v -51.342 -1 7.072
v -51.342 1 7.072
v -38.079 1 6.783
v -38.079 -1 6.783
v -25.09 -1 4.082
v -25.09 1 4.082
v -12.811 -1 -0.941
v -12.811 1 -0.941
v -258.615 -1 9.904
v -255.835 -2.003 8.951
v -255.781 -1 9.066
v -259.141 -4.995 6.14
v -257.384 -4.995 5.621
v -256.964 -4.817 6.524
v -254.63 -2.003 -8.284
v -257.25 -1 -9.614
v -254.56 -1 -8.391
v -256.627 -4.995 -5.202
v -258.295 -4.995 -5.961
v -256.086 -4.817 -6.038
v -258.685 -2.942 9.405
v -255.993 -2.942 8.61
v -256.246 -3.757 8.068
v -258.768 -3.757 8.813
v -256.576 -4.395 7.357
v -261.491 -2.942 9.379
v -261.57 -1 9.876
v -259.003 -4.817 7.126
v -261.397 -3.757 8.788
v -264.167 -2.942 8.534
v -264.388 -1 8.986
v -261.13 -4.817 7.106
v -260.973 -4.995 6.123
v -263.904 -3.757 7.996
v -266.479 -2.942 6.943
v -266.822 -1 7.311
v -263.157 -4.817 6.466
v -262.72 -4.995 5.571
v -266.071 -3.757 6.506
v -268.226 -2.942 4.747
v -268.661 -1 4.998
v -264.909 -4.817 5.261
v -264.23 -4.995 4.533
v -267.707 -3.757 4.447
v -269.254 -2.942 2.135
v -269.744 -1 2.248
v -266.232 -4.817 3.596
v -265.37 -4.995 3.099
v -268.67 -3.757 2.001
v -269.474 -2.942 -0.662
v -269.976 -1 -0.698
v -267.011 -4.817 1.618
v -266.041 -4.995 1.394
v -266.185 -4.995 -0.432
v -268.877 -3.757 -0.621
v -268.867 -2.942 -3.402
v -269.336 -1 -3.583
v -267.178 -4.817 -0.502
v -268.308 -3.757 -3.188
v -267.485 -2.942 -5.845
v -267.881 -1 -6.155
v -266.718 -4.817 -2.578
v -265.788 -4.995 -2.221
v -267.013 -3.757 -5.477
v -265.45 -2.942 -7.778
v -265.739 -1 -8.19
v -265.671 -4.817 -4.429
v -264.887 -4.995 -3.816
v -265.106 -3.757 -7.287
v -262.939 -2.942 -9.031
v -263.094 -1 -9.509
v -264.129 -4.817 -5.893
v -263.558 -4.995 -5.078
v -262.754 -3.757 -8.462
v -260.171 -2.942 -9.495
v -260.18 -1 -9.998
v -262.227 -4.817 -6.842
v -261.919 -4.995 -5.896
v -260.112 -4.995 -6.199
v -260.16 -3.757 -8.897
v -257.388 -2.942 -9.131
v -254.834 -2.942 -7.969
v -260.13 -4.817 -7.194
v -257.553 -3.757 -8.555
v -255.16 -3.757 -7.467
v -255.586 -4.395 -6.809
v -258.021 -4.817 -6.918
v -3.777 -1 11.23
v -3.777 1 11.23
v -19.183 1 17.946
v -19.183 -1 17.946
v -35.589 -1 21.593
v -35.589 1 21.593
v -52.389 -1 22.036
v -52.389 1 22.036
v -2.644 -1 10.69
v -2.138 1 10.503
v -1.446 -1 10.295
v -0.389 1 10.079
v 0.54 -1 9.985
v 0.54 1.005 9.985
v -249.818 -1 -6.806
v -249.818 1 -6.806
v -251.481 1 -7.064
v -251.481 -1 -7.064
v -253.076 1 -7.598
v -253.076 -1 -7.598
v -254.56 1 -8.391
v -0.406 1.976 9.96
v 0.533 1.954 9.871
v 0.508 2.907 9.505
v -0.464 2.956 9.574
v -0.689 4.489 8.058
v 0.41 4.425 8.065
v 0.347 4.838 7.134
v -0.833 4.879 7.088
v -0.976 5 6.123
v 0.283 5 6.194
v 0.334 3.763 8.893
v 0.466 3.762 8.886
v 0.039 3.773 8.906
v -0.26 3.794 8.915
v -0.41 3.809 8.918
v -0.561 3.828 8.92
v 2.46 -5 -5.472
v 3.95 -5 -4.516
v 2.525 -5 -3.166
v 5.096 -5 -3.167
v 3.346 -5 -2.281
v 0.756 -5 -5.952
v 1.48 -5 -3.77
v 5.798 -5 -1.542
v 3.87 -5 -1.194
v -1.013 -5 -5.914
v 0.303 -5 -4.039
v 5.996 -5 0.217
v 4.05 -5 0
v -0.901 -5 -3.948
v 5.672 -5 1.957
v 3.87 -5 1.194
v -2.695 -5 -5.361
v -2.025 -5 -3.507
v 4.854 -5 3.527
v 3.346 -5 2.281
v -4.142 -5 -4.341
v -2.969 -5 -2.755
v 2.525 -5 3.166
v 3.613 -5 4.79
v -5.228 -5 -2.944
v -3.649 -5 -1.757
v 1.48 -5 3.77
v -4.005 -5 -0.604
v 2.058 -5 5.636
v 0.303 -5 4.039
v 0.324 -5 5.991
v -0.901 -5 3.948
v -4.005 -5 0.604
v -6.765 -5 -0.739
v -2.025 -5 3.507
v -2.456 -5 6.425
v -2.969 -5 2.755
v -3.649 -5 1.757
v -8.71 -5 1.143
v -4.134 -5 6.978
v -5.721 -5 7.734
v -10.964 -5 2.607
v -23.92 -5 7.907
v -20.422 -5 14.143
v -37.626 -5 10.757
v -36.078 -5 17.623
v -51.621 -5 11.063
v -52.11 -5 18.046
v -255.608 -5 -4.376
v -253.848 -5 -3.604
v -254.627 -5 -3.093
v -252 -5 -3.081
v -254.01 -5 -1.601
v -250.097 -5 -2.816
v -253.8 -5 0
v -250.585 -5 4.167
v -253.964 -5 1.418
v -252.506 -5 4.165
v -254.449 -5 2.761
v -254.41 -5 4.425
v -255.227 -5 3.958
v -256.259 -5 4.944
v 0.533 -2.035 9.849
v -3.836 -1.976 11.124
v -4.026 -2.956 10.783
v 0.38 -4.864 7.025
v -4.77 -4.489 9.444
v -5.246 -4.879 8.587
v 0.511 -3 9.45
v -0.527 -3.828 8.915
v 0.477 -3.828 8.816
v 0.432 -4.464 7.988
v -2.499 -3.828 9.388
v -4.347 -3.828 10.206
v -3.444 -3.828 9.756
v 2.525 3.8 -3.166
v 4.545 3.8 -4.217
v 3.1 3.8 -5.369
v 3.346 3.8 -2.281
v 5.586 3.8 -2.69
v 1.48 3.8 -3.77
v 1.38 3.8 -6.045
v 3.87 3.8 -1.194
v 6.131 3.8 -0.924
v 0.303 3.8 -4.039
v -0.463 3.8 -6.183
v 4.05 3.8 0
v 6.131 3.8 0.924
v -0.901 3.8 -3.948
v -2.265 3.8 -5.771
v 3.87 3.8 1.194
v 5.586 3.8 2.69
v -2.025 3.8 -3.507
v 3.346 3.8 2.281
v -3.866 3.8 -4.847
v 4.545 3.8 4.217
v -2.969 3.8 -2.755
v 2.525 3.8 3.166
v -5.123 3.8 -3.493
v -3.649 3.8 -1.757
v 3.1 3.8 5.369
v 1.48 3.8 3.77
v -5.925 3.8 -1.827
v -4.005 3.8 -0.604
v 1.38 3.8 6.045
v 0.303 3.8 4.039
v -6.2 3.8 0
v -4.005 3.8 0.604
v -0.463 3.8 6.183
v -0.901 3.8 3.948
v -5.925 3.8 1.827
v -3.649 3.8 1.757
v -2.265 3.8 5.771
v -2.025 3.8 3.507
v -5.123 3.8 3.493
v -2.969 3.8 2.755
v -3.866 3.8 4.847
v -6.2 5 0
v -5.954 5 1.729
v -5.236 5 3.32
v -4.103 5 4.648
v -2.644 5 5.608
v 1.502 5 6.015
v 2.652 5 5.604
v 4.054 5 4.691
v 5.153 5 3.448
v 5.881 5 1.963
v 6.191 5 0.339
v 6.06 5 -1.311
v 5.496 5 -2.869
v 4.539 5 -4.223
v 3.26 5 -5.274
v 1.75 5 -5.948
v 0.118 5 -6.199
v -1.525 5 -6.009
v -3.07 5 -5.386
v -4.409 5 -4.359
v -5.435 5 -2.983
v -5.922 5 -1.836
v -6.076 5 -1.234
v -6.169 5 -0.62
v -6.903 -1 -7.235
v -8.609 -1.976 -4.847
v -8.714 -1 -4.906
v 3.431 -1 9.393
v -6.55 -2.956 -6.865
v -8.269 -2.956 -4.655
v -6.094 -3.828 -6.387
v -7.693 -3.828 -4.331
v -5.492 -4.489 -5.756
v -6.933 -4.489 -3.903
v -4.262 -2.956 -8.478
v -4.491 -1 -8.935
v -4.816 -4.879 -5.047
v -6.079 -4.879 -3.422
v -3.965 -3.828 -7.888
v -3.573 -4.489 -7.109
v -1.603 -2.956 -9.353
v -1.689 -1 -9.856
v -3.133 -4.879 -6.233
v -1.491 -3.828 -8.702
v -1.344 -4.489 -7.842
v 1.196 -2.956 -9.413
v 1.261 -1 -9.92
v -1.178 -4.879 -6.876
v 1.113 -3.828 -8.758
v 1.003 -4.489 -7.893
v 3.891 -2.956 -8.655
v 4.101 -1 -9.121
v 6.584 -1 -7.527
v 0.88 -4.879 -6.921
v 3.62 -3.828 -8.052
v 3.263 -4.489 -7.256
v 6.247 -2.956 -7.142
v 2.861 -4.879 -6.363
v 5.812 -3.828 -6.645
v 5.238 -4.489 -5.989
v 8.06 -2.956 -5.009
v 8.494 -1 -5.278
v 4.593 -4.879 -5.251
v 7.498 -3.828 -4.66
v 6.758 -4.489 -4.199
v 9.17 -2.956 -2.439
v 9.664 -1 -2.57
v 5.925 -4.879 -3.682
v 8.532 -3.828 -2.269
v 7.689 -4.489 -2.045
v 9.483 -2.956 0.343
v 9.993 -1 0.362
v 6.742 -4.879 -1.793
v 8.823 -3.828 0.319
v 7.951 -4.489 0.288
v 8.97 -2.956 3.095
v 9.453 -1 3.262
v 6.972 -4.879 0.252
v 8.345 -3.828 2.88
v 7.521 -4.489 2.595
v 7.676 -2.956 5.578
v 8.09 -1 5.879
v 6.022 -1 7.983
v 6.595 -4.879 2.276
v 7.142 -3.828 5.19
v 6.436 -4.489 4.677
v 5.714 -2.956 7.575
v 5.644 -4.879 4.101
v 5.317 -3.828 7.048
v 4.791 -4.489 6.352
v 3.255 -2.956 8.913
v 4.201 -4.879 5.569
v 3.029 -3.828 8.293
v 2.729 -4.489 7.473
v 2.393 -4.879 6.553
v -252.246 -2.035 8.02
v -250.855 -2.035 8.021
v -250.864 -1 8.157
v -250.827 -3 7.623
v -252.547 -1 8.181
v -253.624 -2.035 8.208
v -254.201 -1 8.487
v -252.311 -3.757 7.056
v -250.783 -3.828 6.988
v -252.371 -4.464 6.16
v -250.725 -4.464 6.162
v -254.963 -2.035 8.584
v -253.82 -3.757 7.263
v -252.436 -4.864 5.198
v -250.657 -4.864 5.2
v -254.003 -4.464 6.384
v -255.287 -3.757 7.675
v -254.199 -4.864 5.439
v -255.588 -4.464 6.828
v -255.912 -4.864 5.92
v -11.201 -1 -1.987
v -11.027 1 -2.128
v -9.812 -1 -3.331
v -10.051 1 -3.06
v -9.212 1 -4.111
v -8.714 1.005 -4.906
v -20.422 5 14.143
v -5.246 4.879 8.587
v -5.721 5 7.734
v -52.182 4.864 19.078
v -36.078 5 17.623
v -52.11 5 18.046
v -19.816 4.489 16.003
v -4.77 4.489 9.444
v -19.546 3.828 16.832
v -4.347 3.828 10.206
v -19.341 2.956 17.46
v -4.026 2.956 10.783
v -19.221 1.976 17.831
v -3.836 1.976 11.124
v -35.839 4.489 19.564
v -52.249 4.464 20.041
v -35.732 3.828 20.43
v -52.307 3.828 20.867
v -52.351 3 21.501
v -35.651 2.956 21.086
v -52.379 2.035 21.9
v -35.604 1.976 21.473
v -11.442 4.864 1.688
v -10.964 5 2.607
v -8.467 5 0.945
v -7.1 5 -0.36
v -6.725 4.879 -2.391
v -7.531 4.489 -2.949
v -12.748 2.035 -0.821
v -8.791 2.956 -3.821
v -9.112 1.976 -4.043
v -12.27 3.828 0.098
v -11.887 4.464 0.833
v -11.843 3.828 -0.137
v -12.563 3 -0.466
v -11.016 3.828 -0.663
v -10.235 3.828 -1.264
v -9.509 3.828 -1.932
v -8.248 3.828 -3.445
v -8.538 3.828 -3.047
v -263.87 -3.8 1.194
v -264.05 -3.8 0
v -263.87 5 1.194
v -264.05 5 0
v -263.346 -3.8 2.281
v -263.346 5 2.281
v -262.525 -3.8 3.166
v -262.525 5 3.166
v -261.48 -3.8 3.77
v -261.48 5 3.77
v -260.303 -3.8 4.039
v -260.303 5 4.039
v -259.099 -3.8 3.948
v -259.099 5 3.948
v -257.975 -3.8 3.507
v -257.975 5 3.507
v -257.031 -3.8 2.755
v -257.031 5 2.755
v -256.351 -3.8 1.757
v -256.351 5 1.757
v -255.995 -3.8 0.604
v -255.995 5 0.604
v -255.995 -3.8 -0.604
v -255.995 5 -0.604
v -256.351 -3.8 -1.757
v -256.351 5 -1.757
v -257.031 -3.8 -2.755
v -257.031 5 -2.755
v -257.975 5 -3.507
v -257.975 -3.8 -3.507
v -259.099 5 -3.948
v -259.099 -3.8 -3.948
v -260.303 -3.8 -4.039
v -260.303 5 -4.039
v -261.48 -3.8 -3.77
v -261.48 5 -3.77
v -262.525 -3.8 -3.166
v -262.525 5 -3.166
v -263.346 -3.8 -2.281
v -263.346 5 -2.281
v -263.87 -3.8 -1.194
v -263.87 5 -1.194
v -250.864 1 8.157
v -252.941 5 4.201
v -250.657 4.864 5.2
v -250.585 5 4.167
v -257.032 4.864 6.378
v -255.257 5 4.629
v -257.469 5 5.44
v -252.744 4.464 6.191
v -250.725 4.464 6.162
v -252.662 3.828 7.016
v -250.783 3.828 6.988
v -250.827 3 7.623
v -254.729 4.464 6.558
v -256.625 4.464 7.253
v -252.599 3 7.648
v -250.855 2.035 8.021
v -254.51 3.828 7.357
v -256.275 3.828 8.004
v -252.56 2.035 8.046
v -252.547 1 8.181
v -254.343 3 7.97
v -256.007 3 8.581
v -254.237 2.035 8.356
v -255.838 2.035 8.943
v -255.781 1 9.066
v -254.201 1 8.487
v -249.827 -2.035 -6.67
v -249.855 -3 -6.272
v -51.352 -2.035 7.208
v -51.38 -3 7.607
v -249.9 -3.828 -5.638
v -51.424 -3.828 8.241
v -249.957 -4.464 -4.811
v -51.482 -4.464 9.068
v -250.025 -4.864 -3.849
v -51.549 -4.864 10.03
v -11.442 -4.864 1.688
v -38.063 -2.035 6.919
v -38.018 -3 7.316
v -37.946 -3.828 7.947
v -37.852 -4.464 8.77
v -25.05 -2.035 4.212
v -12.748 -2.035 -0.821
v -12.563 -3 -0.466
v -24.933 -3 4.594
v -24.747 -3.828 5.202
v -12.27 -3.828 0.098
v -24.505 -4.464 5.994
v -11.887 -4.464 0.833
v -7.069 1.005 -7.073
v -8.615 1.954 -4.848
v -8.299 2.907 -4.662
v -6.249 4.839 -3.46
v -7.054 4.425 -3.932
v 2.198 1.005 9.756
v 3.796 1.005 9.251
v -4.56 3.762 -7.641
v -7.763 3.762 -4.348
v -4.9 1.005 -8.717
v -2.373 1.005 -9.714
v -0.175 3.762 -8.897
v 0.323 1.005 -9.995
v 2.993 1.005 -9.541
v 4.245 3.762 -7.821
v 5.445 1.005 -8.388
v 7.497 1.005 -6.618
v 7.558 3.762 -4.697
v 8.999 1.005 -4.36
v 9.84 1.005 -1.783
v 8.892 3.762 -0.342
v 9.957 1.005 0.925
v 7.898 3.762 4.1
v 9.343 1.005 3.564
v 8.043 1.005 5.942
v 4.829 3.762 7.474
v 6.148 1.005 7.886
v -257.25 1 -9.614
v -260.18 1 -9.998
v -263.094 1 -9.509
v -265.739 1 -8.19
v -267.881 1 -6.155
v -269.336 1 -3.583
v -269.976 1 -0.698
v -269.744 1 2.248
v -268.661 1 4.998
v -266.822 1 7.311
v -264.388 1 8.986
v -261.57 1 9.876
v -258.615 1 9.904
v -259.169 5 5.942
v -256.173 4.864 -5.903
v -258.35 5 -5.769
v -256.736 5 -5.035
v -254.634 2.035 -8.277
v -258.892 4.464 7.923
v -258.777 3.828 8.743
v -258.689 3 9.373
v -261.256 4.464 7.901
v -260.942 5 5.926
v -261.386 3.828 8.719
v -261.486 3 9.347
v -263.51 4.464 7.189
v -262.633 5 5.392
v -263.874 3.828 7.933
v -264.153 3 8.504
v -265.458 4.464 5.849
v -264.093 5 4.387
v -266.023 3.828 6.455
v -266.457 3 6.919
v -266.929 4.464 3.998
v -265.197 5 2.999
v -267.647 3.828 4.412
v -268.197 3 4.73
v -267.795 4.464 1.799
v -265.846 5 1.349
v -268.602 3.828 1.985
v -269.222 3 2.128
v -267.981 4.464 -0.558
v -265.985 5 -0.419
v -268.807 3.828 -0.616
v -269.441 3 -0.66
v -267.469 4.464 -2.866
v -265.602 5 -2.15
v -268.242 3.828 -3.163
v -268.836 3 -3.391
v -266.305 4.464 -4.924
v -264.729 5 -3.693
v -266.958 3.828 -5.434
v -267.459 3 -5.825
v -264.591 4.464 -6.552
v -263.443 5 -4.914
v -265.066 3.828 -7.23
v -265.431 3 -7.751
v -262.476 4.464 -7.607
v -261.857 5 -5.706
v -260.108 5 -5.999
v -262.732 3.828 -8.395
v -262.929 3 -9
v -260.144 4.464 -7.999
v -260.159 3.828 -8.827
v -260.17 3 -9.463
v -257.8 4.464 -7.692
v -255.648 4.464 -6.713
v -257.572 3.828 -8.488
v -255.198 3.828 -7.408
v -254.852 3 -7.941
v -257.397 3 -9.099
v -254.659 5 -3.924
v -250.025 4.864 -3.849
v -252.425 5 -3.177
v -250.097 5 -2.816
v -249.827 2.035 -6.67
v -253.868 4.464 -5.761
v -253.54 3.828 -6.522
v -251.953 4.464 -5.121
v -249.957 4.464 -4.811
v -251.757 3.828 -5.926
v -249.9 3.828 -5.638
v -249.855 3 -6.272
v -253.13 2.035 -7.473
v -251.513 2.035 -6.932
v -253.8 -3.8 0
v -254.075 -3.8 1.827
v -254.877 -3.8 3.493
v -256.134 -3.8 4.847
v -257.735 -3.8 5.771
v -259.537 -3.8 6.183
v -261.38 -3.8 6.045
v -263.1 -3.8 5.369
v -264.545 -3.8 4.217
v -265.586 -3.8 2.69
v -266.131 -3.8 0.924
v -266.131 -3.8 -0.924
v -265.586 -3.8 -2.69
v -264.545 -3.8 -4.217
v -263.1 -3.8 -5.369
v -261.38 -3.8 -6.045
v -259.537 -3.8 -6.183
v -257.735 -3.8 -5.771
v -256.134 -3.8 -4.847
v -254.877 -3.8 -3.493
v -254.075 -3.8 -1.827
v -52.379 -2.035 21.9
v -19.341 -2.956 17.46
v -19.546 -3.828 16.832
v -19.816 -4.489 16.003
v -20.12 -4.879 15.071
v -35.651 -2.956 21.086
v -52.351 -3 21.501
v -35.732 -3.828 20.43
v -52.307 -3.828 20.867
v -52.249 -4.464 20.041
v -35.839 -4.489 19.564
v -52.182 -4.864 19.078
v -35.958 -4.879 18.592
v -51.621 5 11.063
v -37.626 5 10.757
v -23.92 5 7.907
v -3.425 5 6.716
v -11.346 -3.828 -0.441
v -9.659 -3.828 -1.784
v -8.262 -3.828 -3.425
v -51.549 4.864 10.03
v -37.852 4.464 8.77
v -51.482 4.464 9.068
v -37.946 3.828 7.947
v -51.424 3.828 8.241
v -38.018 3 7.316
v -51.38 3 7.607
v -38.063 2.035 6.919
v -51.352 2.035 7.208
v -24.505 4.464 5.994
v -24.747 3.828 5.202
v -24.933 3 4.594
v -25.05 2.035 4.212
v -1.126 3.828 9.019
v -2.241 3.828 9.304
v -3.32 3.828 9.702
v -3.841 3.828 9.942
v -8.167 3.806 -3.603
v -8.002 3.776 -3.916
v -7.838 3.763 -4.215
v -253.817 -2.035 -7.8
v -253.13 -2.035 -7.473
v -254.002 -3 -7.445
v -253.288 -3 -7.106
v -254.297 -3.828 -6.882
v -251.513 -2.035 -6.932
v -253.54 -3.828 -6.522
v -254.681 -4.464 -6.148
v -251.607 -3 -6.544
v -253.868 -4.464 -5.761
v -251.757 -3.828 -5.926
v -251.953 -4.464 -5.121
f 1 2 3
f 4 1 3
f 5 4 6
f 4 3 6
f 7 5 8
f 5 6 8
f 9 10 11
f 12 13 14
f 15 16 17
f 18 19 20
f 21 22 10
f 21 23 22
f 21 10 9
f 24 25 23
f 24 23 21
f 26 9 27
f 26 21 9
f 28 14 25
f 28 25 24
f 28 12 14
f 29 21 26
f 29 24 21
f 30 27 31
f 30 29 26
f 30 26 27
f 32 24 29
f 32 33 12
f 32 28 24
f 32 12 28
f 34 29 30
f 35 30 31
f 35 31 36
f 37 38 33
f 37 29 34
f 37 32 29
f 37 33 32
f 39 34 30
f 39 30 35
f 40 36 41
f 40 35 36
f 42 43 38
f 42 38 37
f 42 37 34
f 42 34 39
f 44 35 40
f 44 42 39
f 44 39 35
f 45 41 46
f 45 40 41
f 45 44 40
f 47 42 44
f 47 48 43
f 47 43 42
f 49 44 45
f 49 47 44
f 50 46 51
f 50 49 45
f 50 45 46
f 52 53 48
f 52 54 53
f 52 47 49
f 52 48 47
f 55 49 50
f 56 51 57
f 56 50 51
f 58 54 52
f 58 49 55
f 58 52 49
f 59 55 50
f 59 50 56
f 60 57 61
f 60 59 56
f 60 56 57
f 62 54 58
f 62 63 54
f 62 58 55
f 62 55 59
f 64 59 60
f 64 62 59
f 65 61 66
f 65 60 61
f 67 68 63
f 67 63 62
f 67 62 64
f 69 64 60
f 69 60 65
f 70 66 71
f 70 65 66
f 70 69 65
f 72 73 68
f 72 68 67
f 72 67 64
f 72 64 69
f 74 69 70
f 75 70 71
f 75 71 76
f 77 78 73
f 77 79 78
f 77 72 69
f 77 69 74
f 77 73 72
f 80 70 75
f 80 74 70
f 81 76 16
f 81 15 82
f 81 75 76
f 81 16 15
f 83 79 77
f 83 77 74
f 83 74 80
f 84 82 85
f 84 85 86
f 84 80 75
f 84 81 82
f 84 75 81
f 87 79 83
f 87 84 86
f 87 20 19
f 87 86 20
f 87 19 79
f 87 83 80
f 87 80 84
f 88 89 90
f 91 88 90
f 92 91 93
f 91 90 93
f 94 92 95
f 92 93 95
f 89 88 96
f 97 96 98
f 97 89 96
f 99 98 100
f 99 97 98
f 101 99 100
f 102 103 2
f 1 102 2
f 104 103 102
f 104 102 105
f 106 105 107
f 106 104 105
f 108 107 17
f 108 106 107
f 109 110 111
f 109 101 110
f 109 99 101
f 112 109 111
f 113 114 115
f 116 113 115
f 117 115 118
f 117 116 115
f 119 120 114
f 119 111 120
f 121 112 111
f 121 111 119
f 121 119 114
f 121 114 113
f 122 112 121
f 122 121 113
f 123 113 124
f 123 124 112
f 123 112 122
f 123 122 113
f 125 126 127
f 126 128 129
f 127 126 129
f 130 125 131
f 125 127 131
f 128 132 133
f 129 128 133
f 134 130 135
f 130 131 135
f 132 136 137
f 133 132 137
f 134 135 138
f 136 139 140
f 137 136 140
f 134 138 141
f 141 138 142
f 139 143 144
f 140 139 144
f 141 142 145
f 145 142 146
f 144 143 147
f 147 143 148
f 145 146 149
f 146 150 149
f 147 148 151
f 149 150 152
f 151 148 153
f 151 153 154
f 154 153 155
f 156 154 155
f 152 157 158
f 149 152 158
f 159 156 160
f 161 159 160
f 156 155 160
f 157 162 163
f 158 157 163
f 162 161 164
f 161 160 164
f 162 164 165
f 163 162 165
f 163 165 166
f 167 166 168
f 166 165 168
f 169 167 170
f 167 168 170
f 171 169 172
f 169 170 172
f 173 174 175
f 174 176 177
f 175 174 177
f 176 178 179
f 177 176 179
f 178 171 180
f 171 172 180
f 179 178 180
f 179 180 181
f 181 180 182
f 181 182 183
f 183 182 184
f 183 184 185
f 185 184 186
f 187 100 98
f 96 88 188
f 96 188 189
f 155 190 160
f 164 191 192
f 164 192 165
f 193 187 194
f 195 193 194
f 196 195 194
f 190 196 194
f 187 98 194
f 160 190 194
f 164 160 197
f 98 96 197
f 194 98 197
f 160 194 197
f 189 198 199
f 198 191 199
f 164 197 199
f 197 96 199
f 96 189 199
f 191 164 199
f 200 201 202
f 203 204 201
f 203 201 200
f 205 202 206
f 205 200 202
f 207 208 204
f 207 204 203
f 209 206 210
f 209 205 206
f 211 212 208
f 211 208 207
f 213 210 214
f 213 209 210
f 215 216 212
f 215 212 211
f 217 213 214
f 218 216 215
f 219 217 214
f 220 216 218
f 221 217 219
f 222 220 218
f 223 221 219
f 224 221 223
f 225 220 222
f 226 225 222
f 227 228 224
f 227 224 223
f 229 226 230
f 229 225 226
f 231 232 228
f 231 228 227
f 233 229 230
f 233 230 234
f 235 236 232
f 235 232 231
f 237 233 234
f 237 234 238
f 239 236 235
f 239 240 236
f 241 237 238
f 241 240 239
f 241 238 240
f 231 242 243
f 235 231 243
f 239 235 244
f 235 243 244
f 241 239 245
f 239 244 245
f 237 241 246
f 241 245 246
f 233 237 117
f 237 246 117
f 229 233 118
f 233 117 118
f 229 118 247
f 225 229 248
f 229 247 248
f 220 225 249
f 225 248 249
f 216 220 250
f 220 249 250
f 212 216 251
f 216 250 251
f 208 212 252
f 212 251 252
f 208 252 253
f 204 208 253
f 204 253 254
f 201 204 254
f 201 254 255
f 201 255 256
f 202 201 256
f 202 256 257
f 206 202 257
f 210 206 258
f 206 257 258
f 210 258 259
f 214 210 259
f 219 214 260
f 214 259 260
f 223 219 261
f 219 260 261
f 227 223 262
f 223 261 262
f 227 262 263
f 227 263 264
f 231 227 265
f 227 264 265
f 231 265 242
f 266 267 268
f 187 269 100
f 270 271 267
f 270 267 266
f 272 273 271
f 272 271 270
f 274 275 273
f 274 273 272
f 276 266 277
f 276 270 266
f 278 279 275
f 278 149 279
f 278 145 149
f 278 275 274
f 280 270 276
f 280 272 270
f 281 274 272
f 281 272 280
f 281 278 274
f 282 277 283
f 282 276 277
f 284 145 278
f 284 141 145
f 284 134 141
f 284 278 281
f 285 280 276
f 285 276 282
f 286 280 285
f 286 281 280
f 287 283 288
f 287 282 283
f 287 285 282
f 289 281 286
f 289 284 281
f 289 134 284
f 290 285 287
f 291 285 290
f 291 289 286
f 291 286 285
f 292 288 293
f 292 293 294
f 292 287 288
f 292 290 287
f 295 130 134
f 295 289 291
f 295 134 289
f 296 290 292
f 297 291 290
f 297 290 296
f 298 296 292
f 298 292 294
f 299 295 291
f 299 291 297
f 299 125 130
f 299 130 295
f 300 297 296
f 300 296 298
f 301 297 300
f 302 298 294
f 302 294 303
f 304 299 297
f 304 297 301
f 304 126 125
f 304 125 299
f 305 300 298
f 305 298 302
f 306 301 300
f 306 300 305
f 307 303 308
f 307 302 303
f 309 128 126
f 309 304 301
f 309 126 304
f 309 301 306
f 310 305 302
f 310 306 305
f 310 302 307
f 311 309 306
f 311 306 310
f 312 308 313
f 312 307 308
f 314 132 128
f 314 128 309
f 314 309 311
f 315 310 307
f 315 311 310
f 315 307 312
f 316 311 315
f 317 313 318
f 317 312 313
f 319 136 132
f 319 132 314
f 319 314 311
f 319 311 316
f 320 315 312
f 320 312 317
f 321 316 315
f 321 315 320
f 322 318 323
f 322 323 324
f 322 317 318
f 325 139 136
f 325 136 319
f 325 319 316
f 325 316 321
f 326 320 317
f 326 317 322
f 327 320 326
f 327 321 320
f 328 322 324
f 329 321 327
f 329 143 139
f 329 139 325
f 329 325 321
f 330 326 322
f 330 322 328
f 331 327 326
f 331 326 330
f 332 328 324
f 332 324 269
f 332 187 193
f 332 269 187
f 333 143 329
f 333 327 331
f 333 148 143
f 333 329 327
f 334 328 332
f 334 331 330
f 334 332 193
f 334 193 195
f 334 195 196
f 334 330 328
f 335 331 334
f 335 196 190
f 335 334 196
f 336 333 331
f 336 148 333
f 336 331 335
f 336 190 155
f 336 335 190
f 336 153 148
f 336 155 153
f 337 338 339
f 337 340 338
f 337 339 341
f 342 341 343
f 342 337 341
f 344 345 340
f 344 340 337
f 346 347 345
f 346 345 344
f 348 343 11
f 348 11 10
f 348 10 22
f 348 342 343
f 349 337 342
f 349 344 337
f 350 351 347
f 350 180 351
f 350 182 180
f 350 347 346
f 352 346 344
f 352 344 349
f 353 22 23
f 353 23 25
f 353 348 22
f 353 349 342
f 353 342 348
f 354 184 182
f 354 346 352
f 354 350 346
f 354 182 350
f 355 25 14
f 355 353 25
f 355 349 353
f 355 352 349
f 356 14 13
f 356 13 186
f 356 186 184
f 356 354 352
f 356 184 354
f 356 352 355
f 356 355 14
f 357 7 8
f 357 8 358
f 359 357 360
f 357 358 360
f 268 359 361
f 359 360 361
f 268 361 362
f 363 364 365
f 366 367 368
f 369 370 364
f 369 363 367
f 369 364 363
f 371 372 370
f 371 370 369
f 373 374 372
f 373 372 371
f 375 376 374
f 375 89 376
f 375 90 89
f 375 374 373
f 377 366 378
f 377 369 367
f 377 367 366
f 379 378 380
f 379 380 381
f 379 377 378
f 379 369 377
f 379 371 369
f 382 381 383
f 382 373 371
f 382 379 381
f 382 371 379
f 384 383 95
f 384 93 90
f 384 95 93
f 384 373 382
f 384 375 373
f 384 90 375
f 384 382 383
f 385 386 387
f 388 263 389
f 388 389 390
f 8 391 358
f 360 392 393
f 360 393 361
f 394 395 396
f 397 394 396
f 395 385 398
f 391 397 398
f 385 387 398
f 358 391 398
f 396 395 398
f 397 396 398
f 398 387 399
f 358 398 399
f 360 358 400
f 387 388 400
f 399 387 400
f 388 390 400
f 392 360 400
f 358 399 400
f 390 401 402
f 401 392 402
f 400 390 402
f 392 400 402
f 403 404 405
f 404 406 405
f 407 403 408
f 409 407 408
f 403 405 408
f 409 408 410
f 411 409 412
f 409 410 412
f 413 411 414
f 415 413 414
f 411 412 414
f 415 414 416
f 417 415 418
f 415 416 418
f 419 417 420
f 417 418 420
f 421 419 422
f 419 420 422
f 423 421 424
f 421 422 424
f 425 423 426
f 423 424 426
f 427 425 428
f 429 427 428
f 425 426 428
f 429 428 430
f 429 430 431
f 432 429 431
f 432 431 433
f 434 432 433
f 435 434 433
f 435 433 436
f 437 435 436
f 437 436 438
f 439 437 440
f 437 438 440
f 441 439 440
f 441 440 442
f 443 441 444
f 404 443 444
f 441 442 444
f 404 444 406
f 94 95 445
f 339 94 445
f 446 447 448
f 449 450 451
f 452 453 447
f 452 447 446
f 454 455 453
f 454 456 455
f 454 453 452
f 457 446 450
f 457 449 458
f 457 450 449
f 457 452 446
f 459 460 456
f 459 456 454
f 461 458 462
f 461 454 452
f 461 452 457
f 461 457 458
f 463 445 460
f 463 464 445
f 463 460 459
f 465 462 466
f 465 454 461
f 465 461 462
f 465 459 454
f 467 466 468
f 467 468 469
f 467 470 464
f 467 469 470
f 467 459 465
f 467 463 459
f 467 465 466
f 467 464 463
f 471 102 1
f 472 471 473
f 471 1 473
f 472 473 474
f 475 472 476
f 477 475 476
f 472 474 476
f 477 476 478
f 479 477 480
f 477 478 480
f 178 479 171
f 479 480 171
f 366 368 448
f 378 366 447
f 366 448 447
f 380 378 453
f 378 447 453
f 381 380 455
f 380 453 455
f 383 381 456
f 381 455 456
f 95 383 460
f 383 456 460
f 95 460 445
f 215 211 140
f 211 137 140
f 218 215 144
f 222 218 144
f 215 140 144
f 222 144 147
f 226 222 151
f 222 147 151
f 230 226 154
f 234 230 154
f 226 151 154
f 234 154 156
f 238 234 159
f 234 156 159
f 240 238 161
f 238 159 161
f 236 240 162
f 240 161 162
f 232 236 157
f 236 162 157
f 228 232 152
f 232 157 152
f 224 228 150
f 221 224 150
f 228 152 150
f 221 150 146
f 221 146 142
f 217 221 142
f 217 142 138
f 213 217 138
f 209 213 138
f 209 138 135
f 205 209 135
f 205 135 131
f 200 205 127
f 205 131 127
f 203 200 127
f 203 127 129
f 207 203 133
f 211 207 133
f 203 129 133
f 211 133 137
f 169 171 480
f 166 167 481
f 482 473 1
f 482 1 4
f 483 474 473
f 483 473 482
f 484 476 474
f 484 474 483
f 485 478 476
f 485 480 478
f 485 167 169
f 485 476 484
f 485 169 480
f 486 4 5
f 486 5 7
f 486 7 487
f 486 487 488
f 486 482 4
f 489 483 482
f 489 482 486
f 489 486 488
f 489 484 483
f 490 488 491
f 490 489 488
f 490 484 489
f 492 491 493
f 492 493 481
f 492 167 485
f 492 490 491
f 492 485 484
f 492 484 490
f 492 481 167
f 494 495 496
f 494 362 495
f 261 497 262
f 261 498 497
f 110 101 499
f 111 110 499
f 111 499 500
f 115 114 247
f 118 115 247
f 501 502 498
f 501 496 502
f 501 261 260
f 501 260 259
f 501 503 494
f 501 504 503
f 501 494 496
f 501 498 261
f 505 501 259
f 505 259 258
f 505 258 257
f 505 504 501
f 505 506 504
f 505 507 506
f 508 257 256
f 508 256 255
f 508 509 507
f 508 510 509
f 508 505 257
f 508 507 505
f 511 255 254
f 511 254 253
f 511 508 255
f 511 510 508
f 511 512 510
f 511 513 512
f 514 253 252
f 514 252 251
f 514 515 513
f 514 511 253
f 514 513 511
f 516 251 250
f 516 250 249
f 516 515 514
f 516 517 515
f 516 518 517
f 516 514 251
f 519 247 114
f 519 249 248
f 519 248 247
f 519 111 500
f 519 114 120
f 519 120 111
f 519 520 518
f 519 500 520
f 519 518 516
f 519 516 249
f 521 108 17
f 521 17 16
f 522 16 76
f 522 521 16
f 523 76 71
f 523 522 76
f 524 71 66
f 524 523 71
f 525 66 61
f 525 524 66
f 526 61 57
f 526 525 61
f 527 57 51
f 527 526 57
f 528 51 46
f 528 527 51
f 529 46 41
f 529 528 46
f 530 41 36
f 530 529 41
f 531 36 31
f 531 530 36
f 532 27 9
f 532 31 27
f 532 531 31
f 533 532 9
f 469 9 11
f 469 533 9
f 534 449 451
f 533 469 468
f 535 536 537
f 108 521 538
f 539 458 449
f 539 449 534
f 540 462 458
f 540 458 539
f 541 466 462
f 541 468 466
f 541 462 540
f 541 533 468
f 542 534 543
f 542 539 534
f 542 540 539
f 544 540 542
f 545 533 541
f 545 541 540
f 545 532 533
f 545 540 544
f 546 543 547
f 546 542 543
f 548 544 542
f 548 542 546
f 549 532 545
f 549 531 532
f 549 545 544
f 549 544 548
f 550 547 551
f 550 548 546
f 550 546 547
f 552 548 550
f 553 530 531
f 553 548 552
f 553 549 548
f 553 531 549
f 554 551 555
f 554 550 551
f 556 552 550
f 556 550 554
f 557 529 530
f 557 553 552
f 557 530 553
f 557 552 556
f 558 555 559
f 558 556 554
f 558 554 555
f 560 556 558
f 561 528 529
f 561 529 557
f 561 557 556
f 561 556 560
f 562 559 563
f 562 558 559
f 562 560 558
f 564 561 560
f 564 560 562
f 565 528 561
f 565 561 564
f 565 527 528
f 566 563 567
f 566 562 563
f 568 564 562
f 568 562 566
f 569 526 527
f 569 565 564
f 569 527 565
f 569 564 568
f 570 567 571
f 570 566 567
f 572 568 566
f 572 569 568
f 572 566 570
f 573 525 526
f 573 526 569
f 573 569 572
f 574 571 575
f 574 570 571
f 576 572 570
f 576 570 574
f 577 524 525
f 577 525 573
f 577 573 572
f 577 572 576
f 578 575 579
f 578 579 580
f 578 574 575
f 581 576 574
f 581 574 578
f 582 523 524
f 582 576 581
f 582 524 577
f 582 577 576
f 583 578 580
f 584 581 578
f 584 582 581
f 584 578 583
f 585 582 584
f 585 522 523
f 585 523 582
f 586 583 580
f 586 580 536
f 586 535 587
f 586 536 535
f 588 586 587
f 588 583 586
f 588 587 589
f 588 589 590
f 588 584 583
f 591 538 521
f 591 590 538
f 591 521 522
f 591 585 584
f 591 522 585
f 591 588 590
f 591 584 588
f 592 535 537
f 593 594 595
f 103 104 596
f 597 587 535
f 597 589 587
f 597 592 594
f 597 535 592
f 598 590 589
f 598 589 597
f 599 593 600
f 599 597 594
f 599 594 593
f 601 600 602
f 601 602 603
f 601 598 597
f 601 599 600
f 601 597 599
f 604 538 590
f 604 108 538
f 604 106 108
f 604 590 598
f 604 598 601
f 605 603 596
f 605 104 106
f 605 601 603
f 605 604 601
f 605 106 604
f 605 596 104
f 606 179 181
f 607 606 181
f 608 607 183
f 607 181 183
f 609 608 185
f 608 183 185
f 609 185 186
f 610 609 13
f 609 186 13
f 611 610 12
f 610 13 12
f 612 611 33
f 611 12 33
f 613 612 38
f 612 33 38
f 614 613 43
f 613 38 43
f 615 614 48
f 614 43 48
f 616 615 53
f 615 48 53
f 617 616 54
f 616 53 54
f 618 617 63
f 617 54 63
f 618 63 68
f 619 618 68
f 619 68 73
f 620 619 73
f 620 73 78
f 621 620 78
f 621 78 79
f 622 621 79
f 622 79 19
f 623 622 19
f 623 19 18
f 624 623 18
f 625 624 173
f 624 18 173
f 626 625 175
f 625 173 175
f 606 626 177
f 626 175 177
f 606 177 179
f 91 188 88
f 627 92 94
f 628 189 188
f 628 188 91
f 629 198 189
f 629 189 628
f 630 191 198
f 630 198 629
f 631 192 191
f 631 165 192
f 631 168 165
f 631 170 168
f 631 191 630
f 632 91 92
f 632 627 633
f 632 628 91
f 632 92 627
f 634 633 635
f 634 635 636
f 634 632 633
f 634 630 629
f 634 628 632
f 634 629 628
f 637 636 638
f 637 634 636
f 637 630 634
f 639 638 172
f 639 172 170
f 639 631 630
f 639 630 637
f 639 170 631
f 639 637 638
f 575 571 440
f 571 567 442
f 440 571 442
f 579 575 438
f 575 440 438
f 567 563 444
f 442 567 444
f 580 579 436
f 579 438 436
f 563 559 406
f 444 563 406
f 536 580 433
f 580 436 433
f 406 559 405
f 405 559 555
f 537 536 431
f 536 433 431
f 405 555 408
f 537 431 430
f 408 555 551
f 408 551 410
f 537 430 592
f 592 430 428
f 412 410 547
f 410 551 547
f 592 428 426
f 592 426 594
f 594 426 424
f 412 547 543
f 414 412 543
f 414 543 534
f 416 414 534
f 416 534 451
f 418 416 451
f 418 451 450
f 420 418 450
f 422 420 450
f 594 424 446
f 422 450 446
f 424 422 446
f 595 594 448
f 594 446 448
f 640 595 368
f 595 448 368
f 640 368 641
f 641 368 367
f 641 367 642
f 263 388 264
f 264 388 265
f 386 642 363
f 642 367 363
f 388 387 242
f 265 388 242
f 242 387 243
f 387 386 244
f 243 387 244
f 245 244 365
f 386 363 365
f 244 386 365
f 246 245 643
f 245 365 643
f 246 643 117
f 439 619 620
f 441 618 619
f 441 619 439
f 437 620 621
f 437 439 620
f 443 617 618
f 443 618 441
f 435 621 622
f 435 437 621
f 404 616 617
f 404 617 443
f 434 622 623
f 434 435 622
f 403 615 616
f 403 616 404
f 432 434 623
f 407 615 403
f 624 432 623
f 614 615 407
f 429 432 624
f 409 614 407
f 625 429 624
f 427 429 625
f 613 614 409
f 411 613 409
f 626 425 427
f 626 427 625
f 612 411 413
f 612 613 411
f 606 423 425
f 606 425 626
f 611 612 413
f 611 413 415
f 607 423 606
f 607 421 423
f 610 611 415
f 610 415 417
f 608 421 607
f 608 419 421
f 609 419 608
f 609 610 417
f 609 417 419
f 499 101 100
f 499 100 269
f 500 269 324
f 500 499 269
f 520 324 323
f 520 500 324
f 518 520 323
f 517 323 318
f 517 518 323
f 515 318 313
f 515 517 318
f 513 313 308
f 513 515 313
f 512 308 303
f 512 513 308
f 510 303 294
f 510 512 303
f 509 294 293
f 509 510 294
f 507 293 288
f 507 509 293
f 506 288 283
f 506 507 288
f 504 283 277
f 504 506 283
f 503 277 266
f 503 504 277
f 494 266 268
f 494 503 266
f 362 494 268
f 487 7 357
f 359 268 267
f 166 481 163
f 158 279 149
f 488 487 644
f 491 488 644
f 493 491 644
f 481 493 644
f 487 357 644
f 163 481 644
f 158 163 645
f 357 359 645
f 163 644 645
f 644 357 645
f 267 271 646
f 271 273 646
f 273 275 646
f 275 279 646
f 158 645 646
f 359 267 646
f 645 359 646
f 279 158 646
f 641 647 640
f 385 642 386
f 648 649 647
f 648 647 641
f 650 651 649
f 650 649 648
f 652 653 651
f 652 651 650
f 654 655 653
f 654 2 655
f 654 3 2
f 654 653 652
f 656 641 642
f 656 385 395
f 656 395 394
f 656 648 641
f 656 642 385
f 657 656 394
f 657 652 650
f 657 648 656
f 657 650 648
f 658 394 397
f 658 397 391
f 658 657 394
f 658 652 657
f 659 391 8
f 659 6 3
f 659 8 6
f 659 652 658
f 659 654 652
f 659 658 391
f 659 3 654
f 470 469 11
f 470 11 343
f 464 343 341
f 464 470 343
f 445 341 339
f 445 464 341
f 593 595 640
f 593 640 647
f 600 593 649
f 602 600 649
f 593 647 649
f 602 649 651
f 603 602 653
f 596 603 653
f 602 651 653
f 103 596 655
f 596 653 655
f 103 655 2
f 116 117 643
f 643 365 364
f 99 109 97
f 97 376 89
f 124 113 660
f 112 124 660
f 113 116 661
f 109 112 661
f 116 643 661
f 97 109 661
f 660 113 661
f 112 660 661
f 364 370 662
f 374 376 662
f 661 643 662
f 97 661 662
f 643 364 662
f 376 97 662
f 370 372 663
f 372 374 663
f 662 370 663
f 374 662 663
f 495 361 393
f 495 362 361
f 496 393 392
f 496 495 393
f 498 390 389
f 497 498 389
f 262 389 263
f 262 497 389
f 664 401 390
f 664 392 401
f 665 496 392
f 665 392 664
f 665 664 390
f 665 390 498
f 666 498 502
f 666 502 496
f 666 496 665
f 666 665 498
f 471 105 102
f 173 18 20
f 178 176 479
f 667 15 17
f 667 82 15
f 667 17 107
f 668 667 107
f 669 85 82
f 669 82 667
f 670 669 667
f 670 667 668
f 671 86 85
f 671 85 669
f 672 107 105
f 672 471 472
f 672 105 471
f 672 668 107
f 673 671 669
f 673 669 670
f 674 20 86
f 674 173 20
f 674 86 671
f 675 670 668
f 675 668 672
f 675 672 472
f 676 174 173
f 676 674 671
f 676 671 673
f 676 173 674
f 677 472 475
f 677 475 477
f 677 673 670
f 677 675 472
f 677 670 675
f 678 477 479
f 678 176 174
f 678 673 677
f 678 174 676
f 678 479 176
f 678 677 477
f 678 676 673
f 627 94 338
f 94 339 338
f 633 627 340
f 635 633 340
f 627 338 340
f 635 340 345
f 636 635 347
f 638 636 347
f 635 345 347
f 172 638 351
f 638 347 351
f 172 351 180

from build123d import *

# Parameters (mm, degrees)
CROQUIS1_R                                           = 4.05
SALIENTE_EXTRUIR1_DEPTH                              = 5
CROQUIS2_R                                           = 10
SALIENTE_EXTRUIR2_DEPTH                              = 10
REDONDEO8_R                                          = 10
REFRENTADO_PARA_TORNILLO_CON_CABEZA_PLAN_D           = 8.1
REFRENTADO_PARA_TORNILLO_CON_CABEZA_PLAN_CBORE_D     = 12.4
REFRENTADO_PARA_TORNILLO_CON_CABEZA_PLAN_CBORE_DEPTH = 1.2
REDONDEO9_R                                          = 4
REFRENTADO_PARA_TORNILLO_CON_CABEZA_2_D              = 8.1
REFRENTADO_PARA_TORNILLO_CON_CABEZA_2_CBORE_D        = 12.4
REFRENTADO_PARA_TORNILLO_CON_CABEZA_2_CBORE_DEPTH    = 1.2


with BuildPart() as part:
    # Croquis1 → Saliente-Extruir1 (new, symmetric)
    with BuildSketch(Plane(origin=(0, 0, 0), x_dir=(-1, 0, 0), z_dir=(0, 1, 0))):
        with BuildLine():
            Line((52.388821078, 22.035902101), (260.523173553, 7.481730377))
            ThreePointArc((260.523173553, 7.481730377), (267.481730377, -0.523173553), (259.476826447, -7.481730377))
            Line((259.476826447, -7.481730377), (51.342473972, 7.072441348))
            ThreePointArc((51.342473972, 7.072441348), (26.697288319, 4.552818898), (4.339230902, -6.117276778))
            ThreePointArc((4.339230902, -6.117276778), (-6.117276778, -4.339230902), (-4.339230902, 6.117276778))
            ThreePointArc((-4.339230902, 6.117276778), (22.644631497, 18.994978455), (52.388821078, 22.035902101))
        make_face()
        with Locations(Location((0, 0, 0), (0, 0, 90))):
            Circle(CROQUIS1_R, mode=Mode.SUBTRACT)
        with Locations(Location((260, 0, 0), (0, 0, 90))):
            Circle(CROQUIS1_R, mode=Mode.SUBTRACT)
    extrude(amount=SALIENTE_EXTRUIR1_DEPTH, both=True)

    # Croquis2 → Saliente-Extruir2 (add)
    with BuildSketch(Plane(origin=(0, 5, 0), x_dir=(-1, 0, 0), z_dir=(0, 1, 0))):
        Circle(CROQUIS2_R)
        with Locations((260, 0)):
            Circle(CROQUIS2_R)
    extrude(amount=-SALIENTE_EXTRUIR2_DEPTH)

    # Redondeo8
    redondeo8_edges = [part.edges().sort_by_distance(p)[0] for p in [
        (-1.45671448, 0, 9.893330224),
        (-253.924907568, 0, 7.943126082),
        (-9.62840856, 0, -2.700694098),
        (-252.878560462, 0, -7.020334672),
    ]]
    fillet(redondeo8_edges, radius=REDONDEO8_R)

    # Refrentado para tornillo con cabeza plan (through all)
    with Locations(Plane(origin=(0, 5, 0), x_dir=(-1, 0, 0), z_dir=(0, 1, 0))):
        with Locations((0, 0)):
            CounterBoreHole(REFRENTADO_PARA_TORNILLO_CON_CABEZA_PLAN_D / 2, REFRENTADO_PARA_TORNILLO_CON_CABEZA_PLAN_CBORE_D / 2, REFRENTADO_PARA_TORNILLO_CON_CABEZA_PLAN_CBORE_DEPTH)

    # Redondeo9
    redondeo9_edges = [part.edges().sort_by_distance(p)[0] for p in [
        (-150.580214018, 5, 0.133062562),
        (-27.298211365, 5, 20.16419235),
        (-31.522388758, 5, 5.730111954),
        (-31.522388758, -5, 5.730111954),
        (8.493504141, 5, -5.278293987),
        (8.493504141, -5, -5.278293987),
        (-269.975640503, -5, -0.697564737),
        (-269.975640503, 5, -0.697564737),
        (-151.626561124, 5, 15.096523316),
        (-151.626561124, -5, 15.096523316),
        (-27.298211365, -5, 20.16419235),
        (-10.473813488, -5, -2.625536281),
        (-10.473813488, 5, -2.625536281),
        (-252.289713604, 5, -7.297475528),
        (-252.289713604, -5, -7.297475528),
        (-253.38036188, -5, 8.299521464),
        (-253.38036188, 5, 8.299521464),
        (-1.68943962, 5, 10.362079146),
        (-1.68943962, -5, 10.362079146),
        (-150.580214018, -5, 0.133062562),
    ]]
    fillet(redondeo9_edges, radius=REDONDEO9_R)

    # Refrentado para tornillo con cabeza  2 (through all)
    with Locations(Plane.XZ.offset(5)):
        with Locations((-260, 0)):
            CounterBoreHole(REFRENTADO_PARA_TORNILLO_CON_CABEZA_2_D / 2, REFRENTADO_PARA_TORNILLO_CON_CABEZA_2_CBORE_D / 2, REFRENTADO_PARA_TORNILLO_CON_CABEZA_2_CBORE_DEPTH)


solid = part.part
